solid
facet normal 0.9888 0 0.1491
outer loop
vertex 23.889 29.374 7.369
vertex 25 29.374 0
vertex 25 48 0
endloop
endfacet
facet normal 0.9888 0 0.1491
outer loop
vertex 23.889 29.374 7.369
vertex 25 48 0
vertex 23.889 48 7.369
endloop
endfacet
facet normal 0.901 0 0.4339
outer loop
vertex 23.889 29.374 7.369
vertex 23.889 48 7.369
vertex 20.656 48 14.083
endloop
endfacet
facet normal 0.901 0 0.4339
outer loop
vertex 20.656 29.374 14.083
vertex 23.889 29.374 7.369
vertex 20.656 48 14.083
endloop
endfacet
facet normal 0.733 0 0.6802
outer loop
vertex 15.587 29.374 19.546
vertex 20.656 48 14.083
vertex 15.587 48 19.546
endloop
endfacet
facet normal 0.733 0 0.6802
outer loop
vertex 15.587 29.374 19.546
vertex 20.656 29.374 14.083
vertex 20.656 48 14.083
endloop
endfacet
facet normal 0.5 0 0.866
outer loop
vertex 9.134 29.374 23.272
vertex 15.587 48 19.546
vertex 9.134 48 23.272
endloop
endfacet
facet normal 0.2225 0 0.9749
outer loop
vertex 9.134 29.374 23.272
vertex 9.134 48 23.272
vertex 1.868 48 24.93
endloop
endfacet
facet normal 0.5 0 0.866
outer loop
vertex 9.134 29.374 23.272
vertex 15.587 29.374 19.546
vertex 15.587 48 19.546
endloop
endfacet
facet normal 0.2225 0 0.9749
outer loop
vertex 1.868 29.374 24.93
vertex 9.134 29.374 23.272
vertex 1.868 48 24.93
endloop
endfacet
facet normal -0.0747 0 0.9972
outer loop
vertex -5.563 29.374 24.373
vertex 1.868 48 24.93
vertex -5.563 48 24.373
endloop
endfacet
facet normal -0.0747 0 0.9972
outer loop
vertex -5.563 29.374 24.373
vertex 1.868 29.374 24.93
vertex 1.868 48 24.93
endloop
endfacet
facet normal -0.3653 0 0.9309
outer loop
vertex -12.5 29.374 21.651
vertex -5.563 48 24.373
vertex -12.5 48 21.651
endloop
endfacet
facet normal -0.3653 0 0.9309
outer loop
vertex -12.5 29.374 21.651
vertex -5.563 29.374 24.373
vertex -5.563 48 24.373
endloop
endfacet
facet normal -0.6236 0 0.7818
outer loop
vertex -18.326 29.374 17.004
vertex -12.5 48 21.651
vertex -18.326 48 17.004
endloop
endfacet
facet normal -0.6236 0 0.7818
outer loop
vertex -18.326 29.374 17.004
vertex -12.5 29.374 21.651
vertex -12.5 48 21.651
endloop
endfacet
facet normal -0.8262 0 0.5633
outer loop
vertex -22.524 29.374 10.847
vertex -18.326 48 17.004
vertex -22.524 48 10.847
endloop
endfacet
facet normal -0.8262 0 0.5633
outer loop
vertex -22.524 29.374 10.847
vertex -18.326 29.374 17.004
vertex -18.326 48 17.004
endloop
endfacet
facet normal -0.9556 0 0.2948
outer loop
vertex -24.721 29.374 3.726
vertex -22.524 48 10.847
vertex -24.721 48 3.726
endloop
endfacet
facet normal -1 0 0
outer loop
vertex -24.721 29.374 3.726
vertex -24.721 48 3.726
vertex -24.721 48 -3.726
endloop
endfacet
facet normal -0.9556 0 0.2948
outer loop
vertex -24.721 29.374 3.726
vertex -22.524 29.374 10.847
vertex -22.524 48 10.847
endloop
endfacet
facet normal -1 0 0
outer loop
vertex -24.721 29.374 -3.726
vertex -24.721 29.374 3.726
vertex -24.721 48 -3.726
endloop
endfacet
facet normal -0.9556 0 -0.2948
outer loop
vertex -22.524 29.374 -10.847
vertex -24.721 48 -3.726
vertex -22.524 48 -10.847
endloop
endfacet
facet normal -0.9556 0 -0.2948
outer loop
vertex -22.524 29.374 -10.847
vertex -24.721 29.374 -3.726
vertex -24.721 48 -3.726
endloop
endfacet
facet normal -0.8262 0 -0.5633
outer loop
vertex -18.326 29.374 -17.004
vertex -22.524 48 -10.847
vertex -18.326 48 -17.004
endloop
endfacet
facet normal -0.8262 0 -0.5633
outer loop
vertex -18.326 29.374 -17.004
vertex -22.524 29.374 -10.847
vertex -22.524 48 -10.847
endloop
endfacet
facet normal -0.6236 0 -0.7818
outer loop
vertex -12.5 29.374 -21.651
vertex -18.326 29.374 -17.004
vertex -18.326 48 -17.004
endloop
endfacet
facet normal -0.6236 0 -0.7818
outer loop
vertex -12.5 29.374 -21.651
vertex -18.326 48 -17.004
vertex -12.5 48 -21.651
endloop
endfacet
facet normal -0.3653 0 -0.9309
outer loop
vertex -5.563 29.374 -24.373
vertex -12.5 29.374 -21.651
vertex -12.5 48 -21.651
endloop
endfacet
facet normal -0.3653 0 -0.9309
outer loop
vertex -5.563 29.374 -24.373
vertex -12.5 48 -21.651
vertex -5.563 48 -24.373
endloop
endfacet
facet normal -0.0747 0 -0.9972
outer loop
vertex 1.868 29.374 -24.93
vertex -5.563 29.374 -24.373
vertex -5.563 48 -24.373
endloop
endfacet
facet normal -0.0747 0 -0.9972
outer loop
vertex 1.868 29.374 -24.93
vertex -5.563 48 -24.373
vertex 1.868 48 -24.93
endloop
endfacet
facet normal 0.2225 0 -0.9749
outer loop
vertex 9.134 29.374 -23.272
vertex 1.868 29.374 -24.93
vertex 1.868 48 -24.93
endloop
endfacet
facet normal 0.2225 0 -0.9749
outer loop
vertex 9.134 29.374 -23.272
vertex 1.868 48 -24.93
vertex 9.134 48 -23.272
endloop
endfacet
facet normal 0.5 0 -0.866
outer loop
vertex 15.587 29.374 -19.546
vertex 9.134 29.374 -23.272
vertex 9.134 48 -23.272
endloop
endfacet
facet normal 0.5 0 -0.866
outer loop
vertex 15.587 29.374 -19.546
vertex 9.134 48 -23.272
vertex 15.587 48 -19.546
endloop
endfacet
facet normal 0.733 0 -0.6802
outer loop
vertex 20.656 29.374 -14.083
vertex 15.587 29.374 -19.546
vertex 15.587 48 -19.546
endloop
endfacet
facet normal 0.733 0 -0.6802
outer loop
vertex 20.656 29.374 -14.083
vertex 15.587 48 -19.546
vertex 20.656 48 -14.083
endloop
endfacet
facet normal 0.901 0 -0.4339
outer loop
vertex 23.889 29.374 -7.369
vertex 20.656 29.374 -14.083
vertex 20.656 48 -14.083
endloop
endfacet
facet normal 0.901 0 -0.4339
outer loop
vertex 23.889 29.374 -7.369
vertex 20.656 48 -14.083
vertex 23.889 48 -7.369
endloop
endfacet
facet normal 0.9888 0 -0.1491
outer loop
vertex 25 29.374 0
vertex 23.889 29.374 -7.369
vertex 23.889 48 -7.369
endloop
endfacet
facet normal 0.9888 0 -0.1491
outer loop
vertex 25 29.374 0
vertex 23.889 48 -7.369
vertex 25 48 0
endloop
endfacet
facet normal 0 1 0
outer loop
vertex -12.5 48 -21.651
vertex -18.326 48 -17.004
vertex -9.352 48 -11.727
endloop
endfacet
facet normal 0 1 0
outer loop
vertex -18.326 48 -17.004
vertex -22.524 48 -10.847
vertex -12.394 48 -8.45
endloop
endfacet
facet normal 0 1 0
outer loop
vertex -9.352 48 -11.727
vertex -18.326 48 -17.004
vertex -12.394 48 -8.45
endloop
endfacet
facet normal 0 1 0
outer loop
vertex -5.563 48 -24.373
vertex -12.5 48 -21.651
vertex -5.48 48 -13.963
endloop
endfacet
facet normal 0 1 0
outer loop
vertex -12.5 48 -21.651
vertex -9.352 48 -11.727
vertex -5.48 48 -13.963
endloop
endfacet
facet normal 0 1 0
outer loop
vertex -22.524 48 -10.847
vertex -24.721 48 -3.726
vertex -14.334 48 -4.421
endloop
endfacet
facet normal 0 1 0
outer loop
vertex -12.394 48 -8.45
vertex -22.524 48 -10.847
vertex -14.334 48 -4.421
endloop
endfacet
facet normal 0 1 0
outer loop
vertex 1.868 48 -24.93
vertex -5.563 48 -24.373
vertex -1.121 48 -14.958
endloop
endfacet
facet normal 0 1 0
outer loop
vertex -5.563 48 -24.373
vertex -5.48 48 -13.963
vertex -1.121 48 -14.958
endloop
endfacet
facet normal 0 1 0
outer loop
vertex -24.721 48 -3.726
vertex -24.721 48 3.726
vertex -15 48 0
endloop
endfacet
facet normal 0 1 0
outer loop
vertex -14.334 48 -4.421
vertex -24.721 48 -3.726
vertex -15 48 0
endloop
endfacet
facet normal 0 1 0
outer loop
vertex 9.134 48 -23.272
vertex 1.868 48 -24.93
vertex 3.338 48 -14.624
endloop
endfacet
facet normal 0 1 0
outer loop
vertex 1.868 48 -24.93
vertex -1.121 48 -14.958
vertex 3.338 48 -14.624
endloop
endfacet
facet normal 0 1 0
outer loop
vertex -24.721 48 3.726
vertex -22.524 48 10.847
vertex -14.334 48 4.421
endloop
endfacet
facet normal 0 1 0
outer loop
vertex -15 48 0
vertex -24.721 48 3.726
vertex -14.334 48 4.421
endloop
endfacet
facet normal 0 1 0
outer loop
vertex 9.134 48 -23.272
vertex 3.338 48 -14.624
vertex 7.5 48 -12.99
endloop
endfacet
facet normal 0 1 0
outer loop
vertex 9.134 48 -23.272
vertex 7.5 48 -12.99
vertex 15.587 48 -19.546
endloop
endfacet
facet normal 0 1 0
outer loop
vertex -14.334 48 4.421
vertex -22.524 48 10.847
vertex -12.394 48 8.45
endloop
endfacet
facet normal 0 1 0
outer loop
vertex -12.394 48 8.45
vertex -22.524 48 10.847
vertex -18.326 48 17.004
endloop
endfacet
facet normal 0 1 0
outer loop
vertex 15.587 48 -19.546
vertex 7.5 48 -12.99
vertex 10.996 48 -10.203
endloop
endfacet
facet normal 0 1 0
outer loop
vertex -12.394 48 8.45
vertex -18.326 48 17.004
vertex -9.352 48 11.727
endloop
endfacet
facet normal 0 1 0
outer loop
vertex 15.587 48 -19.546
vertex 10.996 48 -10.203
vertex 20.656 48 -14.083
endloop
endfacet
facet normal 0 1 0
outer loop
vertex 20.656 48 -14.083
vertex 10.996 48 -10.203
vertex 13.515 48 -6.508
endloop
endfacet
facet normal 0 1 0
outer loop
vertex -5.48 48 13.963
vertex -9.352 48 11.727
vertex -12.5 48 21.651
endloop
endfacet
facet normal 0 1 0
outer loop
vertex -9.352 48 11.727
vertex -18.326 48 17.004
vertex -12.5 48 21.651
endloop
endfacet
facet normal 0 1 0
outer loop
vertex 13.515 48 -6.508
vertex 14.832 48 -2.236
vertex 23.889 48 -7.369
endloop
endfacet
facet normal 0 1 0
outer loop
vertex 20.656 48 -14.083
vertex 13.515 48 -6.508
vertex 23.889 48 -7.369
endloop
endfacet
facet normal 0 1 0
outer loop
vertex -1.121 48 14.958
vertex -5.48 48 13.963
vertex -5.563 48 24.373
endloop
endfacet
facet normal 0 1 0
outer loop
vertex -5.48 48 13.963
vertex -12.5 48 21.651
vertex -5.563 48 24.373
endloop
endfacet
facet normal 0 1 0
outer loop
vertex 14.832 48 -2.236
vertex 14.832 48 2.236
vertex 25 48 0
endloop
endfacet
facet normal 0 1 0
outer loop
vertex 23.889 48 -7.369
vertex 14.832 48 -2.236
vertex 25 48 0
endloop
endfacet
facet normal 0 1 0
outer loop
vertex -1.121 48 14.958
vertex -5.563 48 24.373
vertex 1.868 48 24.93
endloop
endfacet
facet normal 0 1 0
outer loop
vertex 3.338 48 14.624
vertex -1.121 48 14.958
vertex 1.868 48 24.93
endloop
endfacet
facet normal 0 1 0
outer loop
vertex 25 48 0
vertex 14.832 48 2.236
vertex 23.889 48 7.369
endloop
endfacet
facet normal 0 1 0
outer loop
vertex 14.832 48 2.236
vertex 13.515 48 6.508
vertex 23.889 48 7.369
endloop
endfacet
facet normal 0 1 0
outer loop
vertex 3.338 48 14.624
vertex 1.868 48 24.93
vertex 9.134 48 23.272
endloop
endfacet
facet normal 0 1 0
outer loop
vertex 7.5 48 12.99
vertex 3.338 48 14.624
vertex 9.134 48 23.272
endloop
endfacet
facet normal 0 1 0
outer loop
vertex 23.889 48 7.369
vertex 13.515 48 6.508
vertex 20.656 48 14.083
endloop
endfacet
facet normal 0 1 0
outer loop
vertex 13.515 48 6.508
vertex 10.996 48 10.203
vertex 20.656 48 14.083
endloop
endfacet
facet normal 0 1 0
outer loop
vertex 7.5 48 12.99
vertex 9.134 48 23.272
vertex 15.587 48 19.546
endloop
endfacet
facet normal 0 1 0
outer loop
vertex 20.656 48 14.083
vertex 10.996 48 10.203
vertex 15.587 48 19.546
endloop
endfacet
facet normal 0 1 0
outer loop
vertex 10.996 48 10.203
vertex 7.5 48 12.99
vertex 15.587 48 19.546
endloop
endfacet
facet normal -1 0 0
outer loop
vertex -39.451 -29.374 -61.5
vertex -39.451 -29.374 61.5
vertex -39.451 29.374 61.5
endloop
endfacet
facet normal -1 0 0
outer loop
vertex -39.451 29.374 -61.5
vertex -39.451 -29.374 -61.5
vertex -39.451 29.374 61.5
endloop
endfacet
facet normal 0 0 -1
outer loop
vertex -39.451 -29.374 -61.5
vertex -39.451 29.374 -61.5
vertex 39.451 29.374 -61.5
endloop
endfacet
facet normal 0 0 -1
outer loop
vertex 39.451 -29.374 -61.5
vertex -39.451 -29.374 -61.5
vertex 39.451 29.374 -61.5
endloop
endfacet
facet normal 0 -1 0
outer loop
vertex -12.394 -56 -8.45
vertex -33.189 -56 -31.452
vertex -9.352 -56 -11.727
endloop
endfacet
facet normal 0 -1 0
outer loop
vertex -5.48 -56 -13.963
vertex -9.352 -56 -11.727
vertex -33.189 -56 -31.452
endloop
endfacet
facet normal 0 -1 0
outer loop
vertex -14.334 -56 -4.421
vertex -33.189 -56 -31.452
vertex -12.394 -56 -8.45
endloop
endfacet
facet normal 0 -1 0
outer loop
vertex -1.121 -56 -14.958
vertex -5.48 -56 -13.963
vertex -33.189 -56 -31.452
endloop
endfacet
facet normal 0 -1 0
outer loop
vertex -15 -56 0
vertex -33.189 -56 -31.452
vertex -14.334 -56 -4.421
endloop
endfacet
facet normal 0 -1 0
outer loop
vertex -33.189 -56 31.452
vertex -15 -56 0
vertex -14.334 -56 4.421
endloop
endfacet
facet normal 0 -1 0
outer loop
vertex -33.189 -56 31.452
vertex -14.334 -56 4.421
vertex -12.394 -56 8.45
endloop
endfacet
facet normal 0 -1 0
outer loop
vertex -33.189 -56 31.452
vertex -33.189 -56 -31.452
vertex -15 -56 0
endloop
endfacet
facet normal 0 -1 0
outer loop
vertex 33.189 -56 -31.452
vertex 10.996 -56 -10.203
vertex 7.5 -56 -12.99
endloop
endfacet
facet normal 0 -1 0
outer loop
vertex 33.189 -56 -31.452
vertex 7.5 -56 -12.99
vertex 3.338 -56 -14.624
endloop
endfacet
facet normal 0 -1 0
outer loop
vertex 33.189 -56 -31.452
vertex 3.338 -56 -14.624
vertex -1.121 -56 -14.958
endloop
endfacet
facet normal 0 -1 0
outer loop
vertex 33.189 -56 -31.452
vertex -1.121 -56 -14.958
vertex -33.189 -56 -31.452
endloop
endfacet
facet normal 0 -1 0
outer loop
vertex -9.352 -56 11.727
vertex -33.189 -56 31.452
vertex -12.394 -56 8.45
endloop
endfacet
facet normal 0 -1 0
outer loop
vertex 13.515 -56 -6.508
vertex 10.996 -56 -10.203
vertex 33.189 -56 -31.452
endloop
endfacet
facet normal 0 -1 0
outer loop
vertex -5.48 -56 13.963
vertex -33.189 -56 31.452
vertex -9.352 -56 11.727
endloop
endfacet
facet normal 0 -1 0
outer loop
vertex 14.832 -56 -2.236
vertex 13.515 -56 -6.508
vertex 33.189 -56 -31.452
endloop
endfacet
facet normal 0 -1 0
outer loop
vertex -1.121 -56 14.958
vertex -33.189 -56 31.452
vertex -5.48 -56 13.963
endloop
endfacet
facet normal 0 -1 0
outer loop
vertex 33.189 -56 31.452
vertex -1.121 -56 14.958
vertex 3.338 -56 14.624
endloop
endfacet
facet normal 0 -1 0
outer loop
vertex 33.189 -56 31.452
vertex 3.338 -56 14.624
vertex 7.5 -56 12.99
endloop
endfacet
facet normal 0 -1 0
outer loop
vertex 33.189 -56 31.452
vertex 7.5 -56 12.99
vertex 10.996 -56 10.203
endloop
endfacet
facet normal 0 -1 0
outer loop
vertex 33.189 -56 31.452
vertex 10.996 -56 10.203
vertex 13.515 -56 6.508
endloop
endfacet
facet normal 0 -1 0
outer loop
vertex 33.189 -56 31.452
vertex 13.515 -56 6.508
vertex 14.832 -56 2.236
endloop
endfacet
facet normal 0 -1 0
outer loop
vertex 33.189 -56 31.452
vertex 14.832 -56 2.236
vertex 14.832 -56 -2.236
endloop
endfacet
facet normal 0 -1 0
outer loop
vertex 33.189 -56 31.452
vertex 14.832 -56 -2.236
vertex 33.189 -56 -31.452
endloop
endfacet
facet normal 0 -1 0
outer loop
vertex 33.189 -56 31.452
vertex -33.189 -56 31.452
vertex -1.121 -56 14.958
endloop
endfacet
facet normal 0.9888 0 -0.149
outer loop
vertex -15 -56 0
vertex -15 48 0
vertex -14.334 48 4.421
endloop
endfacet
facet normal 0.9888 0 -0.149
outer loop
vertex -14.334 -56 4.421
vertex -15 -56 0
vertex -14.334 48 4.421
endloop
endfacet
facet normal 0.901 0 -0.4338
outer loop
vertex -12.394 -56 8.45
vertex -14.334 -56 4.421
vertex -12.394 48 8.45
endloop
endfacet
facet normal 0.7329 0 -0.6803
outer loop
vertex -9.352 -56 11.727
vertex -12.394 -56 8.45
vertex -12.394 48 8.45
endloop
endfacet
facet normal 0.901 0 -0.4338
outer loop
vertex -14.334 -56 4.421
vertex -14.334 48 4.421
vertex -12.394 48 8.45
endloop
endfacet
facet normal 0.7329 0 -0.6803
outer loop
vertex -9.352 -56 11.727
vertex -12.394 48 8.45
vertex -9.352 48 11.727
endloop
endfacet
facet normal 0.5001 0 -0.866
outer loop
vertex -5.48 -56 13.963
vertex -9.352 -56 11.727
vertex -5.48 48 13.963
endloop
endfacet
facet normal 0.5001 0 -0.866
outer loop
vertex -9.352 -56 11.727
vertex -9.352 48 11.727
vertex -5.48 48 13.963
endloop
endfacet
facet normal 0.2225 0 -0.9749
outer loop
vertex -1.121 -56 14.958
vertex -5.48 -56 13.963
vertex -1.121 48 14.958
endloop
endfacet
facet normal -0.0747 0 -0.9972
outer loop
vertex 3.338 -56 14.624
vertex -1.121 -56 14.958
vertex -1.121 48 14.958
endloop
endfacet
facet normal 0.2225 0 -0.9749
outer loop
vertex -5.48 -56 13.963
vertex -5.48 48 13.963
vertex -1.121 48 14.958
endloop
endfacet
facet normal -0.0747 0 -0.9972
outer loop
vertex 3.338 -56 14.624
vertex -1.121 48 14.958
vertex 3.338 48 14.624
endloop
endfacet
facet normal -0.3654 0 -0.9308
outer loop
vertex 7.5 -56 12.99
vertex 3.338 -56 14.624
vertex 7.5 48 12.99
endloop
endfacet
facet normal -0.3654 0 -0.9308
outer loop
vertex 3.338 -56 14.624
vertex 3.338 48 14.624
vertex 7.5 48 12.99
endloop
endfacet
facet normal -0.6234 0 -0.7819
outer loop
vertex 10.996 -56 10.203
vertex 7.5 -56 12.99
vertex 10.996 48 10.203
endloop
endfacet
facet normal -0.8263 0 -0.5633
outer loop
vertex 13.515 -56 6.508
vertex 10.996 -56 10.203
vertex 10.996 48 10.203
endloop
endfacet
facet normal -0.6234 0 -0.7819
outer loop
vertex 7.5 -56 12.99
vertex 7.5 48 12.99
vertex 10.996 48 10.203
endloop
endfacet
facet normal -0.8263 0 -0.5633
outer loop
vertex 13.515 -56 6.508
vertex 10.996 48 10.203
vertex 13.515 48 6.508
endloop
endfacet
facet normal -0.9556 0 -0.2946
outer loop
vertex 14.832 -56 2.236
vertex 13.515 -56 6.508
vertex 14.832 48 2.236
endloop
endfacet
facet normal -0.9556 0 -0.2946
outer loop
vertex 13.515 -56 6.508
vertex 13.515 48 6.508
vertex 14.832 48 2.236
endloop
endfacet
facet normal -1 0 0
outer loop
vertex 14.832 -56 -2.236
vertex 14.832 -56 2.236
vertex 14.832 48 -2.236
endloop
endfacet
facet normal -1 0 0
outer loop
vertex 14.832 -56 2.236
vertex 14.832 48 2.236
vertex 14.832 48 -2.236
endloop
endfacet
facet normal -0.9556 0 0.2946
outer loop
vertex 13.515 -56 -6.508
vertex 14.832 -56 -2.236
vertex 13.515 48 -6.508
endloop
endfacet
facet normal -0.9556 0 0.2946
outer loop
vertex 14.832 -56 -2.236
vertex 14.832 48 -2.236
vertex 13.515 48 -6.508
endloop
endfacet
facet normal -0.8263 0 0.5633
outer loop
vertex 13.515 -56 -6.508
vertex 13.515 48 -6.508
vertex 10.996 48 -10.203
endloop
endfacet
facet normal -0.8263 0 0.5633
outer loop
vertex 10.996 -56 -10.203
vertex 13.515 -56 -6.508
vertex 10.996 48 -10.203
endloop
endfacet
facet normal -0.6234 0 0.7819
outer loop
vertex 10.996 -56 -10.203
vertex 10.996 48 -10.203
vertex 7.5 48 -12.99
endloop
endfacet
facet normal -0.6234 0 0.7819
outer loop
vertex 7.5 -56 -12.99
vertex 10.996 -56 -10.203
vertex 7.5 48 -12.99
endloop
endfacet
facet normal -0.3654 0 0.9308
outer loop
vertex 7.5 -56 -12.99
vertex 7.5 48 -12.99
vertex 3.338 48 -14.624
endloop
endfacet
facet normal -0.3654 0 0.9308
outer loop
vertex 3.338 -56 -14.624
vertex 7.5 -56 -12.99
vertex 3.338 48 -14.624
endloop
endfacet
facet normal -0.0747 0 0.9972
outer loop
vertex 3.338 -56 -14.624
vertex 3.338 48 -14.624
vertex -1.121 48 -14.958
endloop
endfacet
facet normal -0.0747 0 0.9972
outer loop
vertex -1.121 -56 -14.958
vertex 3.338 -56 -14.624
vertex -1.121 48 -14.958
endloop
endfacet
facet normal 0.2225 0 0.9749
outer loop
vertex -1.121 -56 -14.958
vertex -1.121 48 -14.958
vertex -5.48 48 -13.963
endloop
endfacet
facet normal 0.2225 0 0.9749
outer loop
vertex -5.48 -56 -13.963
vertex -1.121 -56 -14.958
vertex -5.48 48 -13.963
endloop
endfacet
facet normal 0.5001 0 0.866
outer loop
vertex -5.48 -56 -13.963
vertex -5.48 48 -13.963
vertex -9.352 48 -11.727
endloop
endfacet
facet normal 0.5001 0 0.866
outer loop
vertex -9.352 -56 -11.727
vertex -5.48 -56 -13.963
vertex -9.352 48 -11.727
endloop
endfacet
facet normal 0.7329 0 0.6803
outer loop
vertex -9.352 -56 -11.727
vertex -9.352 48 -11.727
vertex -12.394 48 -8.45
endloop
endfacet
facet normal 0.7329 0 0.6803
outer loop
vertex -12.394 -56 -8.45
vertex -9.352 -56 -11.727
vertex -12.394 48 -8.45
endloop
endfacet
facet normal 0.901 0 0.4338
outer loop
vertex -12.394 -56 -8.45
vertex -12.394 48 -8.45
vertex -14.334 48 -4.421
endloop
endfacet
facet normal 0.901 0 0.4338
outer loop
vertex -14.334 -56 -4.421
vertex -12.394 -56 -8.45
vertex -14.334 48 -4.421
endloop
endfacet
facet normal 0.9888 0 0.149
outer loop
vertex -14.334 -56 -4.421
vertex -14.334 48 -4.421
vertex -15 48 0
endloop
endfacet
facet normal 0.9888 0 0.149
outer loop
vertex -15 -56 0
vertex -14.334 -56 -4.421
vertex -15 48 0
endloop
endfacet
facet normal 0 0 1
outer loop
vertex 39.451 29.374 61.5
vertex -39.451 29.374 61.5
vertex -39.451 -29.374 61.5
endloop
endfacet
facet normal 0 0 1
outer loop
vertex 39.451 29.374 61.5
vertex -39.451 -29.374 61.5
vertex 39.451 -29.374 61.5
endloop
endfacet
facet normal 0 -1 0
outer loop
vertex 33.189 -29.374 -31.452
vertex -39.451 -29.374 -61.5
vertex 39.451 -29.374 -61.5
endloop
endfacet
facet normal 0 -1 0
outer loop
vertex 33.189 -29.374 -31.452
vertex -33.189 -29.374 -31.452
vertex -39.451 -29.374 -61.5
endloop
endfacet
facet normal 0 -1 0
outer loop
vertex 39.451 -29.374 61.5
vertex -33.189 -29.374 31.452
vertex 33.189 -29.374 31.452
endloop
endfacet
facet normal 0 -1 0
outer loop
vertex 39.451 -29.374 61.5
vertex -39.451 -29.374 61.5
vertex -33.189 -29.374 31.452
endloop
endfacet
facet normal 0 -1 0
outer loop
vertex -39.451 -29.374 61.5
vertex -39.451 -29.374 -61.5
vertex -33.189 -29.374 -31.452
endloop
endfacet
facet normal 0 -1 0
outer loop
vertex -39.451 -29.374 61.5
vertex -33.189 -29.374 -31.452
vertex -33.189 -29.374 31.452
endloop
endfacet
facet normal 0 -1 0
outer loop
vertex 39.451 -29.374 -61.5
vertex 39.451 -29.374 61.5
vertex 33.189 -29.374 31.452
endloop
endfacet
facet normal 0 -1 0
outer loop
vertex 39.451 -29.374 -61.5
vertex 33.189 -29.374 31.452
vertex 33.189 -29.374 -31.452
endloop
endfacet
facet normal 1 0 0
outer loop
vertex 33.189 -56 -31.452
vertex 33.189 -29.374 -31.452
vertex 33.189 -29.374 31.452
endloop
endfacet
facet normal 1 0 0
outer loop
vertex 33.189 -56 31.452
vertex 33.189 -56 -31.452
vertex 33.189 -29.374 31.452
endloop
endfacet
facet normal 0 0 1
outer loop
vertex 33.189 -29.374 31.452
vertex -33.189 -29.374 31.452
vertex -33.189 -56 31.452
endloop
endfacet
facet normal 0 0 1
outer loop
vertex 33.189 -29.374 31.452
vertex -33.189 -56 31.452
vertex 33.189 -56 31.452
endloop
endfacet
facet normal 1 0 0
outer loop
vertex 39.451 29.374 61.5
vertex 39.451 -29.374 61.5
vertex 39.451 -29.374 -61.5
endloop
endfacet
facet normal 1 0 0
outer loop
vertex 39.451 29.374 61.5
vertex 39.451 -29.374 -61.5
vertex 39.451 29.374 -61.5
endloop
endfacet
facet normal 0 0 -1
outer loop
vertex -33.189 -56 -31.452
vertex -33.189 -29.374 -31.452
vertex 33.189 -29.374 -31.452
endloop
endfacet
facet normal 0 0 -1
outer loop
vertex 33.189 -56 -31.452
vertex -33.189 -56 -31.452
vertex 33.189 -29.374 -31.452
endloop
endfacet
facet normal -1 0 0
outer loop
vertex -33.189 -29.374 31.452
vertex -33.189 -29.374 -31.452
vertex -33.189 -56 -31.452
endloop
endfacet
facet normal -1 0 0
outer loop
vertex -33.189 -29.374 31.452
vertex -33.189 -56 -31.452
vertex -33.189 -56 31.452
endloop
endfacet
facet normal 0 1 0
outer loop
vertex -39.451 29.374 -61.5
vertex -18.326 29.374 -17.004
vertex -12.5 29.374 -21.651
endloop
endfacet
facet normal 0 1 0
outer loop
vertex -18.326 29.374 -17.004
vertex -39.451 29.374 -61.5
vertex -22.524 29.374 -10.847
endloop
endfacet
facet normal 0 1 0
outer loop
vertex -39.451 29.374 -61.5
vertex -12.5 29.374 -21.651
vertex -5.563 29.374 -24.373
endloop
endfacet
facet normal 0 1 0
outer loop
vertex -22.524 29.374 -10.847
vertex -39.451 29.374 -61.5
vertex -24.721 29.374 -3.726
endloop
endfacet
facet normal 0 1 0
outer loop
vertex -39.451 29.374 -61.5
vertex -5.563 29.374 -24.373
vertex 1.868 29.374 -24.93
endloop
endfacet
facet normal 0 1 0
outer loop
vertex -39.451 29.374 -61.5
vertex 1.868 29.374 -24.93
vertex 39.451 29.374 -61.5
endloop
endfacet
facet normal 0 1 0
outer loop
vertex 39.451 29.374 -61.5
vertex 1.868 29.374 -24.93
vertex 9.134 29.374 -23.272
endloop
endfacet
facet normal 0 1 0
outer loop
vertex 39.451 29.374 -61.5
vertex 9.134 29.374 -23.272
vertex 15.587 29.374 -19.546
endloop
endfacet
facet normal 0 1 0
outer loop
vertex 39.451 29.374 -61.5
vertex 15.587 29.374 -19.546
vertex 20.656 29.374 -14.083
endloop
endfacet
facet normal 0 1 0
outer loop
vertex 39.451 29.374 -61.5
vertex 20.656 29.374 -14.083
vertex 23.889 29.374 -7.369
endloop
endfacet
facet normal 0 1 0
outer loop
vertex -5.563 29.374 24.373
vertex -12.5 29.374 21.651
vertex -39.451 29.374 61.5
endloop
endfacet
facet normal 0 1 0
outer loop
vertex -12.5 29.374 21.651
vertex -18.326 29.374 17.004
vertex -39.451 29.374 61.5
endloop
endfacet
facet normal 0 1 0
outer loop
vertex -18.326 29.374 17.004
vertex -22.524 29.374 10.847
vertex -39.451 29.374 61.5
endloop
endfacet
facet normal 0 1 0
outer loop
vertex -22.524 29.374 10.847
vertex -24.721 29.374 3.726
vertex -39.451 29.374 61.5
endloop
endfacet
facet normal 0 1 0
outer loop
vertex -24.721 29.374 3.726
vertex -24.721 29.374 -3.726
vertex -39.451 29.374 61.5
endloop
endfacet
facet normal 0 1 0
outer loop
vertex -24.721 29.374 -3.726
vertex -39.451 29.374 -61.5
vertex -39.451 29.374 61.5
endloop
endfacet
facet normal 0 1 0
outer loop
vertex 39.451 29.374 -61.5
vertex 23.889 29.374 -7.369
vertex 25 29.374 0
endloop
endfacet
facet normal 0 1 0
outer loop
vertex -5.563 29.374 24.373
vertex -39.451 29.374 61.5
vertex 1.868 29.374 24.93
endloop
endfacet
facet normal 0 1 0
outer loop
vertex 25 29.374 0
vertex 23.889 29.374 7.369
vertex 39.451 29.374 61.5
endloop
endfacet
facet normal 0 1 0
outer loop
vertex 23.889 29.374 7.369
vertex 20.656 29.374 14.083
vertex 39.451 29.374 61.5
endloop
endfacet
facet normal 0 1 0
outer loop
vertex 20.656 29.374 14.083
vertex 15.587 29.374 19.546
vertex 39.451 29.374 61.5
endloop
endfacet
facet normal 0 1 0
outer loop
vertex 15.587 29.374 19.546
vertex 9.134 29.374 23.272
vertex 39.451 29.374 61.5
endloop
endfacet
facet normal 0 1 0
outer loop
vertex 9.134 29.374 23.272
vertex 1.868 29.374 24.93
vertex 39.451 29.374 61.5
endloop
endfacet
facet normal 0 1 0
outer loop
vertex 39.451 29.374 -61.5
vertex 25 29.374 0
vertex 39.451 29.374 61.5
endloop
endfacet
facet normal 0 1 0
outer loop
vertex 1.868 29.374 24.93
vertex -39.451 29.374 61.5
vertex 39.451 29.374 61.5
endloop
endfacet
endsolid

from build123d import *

# Parameters (mm, degrees)
F0_R     = 25
F1_DEPTH = 48
F2_W     = 66.378064
F2_H     = 62.903502
F3_DEPTH = 56
F4_W     = 78.902334
F4_H     = 58.748622
F5_DEPTH = 61.5
F6_R     = 15
F7_DEPTH = 105.3


with BuildPart() as f1:
    # F0 (on Front) → F1 (new body)
    with BuildSketch(Plane.XZ):
        Circle(F0_R)
    extrude(amount=-F1_DEPTH)

    # F2 (on Front) → F3 (join)
    with BuildSketch(Plane.XZ):
        Rectangle(F2_W, F2_H)
    extrude(amount=F3_DEPTH)

    # F4 (on Top) → F5 (join, symmetric)
    with BuildSketch(Plane.XY):
        Rectangle(F4_W, F4_H)
    extrude(amount=F5_DEPTH, both=True)

    # F6 (on face) → F7 (cut)
    with BuildSketch(Plane(origin=(0, 48, 0), x_dir=(-1, 0, 0), z_dir=(0, 1, 0))):
        Circle(F6_R)
    extrude(amount=-F7_DEPTH, mode=Mode.SUBTRACT)


solid = f1.part
